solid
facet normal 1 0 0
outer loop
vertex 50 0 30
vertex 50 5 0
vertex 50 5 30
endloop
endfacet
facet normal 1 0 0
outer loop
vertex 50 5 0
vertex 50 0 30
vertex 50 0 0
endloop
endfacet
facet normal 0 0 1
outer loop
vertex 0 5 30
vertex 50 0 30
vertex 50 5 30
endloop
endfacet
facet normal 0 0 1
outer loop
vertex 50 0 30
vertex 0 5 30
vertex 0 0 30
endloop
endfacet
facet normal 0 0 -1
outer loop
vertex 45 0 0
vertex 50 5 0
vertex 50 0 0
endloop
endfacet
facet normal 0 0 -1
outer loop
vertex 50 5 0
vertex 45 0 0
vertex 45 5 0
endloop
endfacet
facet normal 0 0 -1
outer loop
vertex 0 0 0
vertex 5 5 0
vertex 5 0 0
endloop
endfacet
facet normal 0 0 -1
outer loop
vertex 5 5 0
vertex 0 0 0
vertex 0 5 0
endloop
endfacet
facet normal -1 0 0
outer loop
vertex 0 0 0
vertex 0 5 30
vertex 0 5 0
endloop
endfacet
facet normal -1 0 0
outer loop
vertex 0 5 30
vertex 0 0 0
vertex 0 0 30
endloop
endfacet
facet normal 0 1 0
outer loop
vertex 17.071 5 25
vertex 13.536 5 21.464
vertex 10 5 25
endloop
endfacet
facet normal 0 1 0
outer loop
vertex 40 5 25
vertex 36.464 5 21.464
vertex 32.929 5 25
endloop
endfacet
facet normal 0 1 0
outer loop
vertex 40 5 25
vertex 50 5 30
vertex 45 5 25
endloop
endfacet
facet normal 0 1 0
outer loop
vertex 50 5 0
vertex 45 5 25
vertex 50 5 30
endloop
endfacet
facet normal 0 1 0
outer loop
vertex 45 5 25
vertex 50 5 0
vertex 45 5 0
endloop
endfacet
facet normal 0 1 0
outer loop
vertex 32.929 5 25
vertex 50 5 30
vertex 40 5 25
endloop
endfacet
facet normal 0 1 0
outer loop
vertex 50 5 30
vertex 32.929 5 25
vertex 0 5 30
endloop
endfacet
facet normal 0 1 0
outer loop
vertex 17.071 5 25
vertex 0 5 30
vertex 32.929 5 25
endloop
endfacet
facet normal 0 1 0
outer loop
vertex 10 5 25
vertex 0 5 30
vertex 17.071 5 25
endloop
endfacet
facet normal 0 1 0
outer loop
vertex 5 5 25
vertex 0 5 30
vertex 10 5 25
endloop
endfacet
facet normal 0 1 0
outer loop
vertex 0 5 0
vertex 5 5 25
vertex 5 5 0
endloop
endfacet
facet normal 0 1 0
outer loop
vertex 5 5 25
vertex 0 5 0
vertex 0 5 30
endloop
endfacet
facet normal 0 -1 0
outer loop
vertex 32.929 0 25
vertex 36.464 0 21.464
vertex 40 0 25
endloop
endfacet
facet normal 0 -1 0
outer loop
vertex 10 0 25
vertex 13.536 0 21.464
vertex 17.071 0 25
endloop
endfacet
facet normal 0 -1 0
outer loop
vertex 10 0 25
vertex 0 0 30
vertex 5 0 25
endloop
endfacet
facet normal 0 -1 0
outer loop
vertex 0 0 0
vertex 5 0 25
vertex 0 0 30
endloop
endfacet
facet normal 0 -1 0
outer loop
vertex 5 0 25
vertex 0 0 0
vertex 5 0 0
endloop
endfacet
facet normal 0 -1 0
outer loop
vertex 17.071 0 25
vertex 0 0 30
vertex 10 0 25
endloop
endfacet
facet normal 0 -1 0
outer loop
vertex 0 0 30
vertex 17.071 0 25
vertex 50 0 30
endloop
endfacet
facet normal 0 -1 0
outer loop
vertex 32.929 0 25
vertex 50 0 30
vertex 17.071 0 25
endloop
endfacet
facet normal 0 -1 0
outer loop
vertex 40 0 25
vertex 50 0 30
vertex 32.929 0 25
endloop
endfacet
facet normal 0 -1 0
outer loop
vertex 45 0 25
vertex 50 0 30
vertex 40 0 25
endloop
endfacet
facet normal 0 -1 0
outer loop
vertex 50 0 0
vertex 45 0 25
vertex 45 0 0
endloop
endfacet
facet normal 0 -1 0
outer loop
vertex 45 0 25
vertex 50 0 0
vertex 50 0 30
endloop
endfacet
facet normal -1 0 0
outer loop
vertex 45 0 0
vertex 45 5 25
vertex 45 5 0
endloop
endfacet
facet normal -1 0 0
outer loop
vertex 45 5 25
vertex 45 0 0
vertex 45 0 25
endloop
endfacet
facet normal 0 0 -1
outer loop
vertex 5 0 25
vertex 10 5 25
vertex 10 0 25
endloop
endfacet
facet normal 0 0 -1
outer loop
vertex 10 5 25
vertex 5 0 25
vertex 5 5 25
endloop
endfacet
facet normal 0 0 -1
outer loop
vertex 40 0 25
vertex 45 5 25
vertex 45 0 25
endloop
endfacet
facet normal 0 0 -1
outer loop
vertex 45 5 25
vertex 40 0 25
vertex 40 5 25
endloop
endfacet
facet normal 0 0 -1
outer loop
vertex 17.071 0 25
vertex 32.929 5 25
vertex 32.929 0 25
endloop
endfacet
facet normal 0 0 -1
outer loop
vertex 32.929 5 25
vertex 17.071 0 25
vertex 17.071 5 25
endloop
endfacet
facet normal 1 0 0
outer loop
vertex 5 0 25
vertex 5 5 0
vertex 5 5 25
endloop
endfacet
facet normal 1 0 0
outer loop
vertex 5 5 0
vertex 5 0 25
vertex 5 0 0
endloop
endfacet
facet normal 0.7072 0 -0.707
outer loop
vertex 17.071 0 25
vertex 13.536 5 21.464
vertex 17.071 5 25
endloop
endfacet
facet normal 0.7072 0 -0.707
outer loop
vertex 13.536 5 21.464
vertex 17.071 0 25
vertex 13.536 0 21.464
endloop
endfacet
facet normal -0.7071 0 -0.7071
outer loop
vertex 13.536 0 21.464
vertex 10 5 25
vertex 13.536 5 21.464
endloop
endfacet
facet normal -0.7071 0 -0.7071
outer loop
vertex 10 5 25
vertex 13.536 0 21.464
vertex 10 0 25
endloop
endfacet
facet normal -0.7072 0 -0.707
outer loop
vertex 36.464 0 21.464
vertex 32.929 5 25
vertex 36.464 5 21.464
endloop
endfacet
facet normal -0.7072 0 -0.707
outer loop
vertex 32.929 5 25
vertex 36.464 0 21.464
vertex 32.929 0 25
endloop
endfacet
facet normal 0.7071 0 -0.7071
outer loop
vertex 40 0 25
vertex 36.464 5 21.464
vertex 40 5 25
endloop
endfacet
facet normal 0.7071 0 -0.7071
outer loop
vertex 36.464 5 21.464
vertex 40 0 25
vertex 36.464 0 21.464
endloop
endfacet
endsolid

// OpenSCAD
difference() {
	cube([50, 5, 30]);
	translate([5, 0, 0])
		cube([40, 5, 25]);
}
translate([10, 0, 25])
	rotate([0, 45, 0])
		cube(5);
translate([40, 0, 25])
	rotate([0, -135, 0])
		cube(5);
